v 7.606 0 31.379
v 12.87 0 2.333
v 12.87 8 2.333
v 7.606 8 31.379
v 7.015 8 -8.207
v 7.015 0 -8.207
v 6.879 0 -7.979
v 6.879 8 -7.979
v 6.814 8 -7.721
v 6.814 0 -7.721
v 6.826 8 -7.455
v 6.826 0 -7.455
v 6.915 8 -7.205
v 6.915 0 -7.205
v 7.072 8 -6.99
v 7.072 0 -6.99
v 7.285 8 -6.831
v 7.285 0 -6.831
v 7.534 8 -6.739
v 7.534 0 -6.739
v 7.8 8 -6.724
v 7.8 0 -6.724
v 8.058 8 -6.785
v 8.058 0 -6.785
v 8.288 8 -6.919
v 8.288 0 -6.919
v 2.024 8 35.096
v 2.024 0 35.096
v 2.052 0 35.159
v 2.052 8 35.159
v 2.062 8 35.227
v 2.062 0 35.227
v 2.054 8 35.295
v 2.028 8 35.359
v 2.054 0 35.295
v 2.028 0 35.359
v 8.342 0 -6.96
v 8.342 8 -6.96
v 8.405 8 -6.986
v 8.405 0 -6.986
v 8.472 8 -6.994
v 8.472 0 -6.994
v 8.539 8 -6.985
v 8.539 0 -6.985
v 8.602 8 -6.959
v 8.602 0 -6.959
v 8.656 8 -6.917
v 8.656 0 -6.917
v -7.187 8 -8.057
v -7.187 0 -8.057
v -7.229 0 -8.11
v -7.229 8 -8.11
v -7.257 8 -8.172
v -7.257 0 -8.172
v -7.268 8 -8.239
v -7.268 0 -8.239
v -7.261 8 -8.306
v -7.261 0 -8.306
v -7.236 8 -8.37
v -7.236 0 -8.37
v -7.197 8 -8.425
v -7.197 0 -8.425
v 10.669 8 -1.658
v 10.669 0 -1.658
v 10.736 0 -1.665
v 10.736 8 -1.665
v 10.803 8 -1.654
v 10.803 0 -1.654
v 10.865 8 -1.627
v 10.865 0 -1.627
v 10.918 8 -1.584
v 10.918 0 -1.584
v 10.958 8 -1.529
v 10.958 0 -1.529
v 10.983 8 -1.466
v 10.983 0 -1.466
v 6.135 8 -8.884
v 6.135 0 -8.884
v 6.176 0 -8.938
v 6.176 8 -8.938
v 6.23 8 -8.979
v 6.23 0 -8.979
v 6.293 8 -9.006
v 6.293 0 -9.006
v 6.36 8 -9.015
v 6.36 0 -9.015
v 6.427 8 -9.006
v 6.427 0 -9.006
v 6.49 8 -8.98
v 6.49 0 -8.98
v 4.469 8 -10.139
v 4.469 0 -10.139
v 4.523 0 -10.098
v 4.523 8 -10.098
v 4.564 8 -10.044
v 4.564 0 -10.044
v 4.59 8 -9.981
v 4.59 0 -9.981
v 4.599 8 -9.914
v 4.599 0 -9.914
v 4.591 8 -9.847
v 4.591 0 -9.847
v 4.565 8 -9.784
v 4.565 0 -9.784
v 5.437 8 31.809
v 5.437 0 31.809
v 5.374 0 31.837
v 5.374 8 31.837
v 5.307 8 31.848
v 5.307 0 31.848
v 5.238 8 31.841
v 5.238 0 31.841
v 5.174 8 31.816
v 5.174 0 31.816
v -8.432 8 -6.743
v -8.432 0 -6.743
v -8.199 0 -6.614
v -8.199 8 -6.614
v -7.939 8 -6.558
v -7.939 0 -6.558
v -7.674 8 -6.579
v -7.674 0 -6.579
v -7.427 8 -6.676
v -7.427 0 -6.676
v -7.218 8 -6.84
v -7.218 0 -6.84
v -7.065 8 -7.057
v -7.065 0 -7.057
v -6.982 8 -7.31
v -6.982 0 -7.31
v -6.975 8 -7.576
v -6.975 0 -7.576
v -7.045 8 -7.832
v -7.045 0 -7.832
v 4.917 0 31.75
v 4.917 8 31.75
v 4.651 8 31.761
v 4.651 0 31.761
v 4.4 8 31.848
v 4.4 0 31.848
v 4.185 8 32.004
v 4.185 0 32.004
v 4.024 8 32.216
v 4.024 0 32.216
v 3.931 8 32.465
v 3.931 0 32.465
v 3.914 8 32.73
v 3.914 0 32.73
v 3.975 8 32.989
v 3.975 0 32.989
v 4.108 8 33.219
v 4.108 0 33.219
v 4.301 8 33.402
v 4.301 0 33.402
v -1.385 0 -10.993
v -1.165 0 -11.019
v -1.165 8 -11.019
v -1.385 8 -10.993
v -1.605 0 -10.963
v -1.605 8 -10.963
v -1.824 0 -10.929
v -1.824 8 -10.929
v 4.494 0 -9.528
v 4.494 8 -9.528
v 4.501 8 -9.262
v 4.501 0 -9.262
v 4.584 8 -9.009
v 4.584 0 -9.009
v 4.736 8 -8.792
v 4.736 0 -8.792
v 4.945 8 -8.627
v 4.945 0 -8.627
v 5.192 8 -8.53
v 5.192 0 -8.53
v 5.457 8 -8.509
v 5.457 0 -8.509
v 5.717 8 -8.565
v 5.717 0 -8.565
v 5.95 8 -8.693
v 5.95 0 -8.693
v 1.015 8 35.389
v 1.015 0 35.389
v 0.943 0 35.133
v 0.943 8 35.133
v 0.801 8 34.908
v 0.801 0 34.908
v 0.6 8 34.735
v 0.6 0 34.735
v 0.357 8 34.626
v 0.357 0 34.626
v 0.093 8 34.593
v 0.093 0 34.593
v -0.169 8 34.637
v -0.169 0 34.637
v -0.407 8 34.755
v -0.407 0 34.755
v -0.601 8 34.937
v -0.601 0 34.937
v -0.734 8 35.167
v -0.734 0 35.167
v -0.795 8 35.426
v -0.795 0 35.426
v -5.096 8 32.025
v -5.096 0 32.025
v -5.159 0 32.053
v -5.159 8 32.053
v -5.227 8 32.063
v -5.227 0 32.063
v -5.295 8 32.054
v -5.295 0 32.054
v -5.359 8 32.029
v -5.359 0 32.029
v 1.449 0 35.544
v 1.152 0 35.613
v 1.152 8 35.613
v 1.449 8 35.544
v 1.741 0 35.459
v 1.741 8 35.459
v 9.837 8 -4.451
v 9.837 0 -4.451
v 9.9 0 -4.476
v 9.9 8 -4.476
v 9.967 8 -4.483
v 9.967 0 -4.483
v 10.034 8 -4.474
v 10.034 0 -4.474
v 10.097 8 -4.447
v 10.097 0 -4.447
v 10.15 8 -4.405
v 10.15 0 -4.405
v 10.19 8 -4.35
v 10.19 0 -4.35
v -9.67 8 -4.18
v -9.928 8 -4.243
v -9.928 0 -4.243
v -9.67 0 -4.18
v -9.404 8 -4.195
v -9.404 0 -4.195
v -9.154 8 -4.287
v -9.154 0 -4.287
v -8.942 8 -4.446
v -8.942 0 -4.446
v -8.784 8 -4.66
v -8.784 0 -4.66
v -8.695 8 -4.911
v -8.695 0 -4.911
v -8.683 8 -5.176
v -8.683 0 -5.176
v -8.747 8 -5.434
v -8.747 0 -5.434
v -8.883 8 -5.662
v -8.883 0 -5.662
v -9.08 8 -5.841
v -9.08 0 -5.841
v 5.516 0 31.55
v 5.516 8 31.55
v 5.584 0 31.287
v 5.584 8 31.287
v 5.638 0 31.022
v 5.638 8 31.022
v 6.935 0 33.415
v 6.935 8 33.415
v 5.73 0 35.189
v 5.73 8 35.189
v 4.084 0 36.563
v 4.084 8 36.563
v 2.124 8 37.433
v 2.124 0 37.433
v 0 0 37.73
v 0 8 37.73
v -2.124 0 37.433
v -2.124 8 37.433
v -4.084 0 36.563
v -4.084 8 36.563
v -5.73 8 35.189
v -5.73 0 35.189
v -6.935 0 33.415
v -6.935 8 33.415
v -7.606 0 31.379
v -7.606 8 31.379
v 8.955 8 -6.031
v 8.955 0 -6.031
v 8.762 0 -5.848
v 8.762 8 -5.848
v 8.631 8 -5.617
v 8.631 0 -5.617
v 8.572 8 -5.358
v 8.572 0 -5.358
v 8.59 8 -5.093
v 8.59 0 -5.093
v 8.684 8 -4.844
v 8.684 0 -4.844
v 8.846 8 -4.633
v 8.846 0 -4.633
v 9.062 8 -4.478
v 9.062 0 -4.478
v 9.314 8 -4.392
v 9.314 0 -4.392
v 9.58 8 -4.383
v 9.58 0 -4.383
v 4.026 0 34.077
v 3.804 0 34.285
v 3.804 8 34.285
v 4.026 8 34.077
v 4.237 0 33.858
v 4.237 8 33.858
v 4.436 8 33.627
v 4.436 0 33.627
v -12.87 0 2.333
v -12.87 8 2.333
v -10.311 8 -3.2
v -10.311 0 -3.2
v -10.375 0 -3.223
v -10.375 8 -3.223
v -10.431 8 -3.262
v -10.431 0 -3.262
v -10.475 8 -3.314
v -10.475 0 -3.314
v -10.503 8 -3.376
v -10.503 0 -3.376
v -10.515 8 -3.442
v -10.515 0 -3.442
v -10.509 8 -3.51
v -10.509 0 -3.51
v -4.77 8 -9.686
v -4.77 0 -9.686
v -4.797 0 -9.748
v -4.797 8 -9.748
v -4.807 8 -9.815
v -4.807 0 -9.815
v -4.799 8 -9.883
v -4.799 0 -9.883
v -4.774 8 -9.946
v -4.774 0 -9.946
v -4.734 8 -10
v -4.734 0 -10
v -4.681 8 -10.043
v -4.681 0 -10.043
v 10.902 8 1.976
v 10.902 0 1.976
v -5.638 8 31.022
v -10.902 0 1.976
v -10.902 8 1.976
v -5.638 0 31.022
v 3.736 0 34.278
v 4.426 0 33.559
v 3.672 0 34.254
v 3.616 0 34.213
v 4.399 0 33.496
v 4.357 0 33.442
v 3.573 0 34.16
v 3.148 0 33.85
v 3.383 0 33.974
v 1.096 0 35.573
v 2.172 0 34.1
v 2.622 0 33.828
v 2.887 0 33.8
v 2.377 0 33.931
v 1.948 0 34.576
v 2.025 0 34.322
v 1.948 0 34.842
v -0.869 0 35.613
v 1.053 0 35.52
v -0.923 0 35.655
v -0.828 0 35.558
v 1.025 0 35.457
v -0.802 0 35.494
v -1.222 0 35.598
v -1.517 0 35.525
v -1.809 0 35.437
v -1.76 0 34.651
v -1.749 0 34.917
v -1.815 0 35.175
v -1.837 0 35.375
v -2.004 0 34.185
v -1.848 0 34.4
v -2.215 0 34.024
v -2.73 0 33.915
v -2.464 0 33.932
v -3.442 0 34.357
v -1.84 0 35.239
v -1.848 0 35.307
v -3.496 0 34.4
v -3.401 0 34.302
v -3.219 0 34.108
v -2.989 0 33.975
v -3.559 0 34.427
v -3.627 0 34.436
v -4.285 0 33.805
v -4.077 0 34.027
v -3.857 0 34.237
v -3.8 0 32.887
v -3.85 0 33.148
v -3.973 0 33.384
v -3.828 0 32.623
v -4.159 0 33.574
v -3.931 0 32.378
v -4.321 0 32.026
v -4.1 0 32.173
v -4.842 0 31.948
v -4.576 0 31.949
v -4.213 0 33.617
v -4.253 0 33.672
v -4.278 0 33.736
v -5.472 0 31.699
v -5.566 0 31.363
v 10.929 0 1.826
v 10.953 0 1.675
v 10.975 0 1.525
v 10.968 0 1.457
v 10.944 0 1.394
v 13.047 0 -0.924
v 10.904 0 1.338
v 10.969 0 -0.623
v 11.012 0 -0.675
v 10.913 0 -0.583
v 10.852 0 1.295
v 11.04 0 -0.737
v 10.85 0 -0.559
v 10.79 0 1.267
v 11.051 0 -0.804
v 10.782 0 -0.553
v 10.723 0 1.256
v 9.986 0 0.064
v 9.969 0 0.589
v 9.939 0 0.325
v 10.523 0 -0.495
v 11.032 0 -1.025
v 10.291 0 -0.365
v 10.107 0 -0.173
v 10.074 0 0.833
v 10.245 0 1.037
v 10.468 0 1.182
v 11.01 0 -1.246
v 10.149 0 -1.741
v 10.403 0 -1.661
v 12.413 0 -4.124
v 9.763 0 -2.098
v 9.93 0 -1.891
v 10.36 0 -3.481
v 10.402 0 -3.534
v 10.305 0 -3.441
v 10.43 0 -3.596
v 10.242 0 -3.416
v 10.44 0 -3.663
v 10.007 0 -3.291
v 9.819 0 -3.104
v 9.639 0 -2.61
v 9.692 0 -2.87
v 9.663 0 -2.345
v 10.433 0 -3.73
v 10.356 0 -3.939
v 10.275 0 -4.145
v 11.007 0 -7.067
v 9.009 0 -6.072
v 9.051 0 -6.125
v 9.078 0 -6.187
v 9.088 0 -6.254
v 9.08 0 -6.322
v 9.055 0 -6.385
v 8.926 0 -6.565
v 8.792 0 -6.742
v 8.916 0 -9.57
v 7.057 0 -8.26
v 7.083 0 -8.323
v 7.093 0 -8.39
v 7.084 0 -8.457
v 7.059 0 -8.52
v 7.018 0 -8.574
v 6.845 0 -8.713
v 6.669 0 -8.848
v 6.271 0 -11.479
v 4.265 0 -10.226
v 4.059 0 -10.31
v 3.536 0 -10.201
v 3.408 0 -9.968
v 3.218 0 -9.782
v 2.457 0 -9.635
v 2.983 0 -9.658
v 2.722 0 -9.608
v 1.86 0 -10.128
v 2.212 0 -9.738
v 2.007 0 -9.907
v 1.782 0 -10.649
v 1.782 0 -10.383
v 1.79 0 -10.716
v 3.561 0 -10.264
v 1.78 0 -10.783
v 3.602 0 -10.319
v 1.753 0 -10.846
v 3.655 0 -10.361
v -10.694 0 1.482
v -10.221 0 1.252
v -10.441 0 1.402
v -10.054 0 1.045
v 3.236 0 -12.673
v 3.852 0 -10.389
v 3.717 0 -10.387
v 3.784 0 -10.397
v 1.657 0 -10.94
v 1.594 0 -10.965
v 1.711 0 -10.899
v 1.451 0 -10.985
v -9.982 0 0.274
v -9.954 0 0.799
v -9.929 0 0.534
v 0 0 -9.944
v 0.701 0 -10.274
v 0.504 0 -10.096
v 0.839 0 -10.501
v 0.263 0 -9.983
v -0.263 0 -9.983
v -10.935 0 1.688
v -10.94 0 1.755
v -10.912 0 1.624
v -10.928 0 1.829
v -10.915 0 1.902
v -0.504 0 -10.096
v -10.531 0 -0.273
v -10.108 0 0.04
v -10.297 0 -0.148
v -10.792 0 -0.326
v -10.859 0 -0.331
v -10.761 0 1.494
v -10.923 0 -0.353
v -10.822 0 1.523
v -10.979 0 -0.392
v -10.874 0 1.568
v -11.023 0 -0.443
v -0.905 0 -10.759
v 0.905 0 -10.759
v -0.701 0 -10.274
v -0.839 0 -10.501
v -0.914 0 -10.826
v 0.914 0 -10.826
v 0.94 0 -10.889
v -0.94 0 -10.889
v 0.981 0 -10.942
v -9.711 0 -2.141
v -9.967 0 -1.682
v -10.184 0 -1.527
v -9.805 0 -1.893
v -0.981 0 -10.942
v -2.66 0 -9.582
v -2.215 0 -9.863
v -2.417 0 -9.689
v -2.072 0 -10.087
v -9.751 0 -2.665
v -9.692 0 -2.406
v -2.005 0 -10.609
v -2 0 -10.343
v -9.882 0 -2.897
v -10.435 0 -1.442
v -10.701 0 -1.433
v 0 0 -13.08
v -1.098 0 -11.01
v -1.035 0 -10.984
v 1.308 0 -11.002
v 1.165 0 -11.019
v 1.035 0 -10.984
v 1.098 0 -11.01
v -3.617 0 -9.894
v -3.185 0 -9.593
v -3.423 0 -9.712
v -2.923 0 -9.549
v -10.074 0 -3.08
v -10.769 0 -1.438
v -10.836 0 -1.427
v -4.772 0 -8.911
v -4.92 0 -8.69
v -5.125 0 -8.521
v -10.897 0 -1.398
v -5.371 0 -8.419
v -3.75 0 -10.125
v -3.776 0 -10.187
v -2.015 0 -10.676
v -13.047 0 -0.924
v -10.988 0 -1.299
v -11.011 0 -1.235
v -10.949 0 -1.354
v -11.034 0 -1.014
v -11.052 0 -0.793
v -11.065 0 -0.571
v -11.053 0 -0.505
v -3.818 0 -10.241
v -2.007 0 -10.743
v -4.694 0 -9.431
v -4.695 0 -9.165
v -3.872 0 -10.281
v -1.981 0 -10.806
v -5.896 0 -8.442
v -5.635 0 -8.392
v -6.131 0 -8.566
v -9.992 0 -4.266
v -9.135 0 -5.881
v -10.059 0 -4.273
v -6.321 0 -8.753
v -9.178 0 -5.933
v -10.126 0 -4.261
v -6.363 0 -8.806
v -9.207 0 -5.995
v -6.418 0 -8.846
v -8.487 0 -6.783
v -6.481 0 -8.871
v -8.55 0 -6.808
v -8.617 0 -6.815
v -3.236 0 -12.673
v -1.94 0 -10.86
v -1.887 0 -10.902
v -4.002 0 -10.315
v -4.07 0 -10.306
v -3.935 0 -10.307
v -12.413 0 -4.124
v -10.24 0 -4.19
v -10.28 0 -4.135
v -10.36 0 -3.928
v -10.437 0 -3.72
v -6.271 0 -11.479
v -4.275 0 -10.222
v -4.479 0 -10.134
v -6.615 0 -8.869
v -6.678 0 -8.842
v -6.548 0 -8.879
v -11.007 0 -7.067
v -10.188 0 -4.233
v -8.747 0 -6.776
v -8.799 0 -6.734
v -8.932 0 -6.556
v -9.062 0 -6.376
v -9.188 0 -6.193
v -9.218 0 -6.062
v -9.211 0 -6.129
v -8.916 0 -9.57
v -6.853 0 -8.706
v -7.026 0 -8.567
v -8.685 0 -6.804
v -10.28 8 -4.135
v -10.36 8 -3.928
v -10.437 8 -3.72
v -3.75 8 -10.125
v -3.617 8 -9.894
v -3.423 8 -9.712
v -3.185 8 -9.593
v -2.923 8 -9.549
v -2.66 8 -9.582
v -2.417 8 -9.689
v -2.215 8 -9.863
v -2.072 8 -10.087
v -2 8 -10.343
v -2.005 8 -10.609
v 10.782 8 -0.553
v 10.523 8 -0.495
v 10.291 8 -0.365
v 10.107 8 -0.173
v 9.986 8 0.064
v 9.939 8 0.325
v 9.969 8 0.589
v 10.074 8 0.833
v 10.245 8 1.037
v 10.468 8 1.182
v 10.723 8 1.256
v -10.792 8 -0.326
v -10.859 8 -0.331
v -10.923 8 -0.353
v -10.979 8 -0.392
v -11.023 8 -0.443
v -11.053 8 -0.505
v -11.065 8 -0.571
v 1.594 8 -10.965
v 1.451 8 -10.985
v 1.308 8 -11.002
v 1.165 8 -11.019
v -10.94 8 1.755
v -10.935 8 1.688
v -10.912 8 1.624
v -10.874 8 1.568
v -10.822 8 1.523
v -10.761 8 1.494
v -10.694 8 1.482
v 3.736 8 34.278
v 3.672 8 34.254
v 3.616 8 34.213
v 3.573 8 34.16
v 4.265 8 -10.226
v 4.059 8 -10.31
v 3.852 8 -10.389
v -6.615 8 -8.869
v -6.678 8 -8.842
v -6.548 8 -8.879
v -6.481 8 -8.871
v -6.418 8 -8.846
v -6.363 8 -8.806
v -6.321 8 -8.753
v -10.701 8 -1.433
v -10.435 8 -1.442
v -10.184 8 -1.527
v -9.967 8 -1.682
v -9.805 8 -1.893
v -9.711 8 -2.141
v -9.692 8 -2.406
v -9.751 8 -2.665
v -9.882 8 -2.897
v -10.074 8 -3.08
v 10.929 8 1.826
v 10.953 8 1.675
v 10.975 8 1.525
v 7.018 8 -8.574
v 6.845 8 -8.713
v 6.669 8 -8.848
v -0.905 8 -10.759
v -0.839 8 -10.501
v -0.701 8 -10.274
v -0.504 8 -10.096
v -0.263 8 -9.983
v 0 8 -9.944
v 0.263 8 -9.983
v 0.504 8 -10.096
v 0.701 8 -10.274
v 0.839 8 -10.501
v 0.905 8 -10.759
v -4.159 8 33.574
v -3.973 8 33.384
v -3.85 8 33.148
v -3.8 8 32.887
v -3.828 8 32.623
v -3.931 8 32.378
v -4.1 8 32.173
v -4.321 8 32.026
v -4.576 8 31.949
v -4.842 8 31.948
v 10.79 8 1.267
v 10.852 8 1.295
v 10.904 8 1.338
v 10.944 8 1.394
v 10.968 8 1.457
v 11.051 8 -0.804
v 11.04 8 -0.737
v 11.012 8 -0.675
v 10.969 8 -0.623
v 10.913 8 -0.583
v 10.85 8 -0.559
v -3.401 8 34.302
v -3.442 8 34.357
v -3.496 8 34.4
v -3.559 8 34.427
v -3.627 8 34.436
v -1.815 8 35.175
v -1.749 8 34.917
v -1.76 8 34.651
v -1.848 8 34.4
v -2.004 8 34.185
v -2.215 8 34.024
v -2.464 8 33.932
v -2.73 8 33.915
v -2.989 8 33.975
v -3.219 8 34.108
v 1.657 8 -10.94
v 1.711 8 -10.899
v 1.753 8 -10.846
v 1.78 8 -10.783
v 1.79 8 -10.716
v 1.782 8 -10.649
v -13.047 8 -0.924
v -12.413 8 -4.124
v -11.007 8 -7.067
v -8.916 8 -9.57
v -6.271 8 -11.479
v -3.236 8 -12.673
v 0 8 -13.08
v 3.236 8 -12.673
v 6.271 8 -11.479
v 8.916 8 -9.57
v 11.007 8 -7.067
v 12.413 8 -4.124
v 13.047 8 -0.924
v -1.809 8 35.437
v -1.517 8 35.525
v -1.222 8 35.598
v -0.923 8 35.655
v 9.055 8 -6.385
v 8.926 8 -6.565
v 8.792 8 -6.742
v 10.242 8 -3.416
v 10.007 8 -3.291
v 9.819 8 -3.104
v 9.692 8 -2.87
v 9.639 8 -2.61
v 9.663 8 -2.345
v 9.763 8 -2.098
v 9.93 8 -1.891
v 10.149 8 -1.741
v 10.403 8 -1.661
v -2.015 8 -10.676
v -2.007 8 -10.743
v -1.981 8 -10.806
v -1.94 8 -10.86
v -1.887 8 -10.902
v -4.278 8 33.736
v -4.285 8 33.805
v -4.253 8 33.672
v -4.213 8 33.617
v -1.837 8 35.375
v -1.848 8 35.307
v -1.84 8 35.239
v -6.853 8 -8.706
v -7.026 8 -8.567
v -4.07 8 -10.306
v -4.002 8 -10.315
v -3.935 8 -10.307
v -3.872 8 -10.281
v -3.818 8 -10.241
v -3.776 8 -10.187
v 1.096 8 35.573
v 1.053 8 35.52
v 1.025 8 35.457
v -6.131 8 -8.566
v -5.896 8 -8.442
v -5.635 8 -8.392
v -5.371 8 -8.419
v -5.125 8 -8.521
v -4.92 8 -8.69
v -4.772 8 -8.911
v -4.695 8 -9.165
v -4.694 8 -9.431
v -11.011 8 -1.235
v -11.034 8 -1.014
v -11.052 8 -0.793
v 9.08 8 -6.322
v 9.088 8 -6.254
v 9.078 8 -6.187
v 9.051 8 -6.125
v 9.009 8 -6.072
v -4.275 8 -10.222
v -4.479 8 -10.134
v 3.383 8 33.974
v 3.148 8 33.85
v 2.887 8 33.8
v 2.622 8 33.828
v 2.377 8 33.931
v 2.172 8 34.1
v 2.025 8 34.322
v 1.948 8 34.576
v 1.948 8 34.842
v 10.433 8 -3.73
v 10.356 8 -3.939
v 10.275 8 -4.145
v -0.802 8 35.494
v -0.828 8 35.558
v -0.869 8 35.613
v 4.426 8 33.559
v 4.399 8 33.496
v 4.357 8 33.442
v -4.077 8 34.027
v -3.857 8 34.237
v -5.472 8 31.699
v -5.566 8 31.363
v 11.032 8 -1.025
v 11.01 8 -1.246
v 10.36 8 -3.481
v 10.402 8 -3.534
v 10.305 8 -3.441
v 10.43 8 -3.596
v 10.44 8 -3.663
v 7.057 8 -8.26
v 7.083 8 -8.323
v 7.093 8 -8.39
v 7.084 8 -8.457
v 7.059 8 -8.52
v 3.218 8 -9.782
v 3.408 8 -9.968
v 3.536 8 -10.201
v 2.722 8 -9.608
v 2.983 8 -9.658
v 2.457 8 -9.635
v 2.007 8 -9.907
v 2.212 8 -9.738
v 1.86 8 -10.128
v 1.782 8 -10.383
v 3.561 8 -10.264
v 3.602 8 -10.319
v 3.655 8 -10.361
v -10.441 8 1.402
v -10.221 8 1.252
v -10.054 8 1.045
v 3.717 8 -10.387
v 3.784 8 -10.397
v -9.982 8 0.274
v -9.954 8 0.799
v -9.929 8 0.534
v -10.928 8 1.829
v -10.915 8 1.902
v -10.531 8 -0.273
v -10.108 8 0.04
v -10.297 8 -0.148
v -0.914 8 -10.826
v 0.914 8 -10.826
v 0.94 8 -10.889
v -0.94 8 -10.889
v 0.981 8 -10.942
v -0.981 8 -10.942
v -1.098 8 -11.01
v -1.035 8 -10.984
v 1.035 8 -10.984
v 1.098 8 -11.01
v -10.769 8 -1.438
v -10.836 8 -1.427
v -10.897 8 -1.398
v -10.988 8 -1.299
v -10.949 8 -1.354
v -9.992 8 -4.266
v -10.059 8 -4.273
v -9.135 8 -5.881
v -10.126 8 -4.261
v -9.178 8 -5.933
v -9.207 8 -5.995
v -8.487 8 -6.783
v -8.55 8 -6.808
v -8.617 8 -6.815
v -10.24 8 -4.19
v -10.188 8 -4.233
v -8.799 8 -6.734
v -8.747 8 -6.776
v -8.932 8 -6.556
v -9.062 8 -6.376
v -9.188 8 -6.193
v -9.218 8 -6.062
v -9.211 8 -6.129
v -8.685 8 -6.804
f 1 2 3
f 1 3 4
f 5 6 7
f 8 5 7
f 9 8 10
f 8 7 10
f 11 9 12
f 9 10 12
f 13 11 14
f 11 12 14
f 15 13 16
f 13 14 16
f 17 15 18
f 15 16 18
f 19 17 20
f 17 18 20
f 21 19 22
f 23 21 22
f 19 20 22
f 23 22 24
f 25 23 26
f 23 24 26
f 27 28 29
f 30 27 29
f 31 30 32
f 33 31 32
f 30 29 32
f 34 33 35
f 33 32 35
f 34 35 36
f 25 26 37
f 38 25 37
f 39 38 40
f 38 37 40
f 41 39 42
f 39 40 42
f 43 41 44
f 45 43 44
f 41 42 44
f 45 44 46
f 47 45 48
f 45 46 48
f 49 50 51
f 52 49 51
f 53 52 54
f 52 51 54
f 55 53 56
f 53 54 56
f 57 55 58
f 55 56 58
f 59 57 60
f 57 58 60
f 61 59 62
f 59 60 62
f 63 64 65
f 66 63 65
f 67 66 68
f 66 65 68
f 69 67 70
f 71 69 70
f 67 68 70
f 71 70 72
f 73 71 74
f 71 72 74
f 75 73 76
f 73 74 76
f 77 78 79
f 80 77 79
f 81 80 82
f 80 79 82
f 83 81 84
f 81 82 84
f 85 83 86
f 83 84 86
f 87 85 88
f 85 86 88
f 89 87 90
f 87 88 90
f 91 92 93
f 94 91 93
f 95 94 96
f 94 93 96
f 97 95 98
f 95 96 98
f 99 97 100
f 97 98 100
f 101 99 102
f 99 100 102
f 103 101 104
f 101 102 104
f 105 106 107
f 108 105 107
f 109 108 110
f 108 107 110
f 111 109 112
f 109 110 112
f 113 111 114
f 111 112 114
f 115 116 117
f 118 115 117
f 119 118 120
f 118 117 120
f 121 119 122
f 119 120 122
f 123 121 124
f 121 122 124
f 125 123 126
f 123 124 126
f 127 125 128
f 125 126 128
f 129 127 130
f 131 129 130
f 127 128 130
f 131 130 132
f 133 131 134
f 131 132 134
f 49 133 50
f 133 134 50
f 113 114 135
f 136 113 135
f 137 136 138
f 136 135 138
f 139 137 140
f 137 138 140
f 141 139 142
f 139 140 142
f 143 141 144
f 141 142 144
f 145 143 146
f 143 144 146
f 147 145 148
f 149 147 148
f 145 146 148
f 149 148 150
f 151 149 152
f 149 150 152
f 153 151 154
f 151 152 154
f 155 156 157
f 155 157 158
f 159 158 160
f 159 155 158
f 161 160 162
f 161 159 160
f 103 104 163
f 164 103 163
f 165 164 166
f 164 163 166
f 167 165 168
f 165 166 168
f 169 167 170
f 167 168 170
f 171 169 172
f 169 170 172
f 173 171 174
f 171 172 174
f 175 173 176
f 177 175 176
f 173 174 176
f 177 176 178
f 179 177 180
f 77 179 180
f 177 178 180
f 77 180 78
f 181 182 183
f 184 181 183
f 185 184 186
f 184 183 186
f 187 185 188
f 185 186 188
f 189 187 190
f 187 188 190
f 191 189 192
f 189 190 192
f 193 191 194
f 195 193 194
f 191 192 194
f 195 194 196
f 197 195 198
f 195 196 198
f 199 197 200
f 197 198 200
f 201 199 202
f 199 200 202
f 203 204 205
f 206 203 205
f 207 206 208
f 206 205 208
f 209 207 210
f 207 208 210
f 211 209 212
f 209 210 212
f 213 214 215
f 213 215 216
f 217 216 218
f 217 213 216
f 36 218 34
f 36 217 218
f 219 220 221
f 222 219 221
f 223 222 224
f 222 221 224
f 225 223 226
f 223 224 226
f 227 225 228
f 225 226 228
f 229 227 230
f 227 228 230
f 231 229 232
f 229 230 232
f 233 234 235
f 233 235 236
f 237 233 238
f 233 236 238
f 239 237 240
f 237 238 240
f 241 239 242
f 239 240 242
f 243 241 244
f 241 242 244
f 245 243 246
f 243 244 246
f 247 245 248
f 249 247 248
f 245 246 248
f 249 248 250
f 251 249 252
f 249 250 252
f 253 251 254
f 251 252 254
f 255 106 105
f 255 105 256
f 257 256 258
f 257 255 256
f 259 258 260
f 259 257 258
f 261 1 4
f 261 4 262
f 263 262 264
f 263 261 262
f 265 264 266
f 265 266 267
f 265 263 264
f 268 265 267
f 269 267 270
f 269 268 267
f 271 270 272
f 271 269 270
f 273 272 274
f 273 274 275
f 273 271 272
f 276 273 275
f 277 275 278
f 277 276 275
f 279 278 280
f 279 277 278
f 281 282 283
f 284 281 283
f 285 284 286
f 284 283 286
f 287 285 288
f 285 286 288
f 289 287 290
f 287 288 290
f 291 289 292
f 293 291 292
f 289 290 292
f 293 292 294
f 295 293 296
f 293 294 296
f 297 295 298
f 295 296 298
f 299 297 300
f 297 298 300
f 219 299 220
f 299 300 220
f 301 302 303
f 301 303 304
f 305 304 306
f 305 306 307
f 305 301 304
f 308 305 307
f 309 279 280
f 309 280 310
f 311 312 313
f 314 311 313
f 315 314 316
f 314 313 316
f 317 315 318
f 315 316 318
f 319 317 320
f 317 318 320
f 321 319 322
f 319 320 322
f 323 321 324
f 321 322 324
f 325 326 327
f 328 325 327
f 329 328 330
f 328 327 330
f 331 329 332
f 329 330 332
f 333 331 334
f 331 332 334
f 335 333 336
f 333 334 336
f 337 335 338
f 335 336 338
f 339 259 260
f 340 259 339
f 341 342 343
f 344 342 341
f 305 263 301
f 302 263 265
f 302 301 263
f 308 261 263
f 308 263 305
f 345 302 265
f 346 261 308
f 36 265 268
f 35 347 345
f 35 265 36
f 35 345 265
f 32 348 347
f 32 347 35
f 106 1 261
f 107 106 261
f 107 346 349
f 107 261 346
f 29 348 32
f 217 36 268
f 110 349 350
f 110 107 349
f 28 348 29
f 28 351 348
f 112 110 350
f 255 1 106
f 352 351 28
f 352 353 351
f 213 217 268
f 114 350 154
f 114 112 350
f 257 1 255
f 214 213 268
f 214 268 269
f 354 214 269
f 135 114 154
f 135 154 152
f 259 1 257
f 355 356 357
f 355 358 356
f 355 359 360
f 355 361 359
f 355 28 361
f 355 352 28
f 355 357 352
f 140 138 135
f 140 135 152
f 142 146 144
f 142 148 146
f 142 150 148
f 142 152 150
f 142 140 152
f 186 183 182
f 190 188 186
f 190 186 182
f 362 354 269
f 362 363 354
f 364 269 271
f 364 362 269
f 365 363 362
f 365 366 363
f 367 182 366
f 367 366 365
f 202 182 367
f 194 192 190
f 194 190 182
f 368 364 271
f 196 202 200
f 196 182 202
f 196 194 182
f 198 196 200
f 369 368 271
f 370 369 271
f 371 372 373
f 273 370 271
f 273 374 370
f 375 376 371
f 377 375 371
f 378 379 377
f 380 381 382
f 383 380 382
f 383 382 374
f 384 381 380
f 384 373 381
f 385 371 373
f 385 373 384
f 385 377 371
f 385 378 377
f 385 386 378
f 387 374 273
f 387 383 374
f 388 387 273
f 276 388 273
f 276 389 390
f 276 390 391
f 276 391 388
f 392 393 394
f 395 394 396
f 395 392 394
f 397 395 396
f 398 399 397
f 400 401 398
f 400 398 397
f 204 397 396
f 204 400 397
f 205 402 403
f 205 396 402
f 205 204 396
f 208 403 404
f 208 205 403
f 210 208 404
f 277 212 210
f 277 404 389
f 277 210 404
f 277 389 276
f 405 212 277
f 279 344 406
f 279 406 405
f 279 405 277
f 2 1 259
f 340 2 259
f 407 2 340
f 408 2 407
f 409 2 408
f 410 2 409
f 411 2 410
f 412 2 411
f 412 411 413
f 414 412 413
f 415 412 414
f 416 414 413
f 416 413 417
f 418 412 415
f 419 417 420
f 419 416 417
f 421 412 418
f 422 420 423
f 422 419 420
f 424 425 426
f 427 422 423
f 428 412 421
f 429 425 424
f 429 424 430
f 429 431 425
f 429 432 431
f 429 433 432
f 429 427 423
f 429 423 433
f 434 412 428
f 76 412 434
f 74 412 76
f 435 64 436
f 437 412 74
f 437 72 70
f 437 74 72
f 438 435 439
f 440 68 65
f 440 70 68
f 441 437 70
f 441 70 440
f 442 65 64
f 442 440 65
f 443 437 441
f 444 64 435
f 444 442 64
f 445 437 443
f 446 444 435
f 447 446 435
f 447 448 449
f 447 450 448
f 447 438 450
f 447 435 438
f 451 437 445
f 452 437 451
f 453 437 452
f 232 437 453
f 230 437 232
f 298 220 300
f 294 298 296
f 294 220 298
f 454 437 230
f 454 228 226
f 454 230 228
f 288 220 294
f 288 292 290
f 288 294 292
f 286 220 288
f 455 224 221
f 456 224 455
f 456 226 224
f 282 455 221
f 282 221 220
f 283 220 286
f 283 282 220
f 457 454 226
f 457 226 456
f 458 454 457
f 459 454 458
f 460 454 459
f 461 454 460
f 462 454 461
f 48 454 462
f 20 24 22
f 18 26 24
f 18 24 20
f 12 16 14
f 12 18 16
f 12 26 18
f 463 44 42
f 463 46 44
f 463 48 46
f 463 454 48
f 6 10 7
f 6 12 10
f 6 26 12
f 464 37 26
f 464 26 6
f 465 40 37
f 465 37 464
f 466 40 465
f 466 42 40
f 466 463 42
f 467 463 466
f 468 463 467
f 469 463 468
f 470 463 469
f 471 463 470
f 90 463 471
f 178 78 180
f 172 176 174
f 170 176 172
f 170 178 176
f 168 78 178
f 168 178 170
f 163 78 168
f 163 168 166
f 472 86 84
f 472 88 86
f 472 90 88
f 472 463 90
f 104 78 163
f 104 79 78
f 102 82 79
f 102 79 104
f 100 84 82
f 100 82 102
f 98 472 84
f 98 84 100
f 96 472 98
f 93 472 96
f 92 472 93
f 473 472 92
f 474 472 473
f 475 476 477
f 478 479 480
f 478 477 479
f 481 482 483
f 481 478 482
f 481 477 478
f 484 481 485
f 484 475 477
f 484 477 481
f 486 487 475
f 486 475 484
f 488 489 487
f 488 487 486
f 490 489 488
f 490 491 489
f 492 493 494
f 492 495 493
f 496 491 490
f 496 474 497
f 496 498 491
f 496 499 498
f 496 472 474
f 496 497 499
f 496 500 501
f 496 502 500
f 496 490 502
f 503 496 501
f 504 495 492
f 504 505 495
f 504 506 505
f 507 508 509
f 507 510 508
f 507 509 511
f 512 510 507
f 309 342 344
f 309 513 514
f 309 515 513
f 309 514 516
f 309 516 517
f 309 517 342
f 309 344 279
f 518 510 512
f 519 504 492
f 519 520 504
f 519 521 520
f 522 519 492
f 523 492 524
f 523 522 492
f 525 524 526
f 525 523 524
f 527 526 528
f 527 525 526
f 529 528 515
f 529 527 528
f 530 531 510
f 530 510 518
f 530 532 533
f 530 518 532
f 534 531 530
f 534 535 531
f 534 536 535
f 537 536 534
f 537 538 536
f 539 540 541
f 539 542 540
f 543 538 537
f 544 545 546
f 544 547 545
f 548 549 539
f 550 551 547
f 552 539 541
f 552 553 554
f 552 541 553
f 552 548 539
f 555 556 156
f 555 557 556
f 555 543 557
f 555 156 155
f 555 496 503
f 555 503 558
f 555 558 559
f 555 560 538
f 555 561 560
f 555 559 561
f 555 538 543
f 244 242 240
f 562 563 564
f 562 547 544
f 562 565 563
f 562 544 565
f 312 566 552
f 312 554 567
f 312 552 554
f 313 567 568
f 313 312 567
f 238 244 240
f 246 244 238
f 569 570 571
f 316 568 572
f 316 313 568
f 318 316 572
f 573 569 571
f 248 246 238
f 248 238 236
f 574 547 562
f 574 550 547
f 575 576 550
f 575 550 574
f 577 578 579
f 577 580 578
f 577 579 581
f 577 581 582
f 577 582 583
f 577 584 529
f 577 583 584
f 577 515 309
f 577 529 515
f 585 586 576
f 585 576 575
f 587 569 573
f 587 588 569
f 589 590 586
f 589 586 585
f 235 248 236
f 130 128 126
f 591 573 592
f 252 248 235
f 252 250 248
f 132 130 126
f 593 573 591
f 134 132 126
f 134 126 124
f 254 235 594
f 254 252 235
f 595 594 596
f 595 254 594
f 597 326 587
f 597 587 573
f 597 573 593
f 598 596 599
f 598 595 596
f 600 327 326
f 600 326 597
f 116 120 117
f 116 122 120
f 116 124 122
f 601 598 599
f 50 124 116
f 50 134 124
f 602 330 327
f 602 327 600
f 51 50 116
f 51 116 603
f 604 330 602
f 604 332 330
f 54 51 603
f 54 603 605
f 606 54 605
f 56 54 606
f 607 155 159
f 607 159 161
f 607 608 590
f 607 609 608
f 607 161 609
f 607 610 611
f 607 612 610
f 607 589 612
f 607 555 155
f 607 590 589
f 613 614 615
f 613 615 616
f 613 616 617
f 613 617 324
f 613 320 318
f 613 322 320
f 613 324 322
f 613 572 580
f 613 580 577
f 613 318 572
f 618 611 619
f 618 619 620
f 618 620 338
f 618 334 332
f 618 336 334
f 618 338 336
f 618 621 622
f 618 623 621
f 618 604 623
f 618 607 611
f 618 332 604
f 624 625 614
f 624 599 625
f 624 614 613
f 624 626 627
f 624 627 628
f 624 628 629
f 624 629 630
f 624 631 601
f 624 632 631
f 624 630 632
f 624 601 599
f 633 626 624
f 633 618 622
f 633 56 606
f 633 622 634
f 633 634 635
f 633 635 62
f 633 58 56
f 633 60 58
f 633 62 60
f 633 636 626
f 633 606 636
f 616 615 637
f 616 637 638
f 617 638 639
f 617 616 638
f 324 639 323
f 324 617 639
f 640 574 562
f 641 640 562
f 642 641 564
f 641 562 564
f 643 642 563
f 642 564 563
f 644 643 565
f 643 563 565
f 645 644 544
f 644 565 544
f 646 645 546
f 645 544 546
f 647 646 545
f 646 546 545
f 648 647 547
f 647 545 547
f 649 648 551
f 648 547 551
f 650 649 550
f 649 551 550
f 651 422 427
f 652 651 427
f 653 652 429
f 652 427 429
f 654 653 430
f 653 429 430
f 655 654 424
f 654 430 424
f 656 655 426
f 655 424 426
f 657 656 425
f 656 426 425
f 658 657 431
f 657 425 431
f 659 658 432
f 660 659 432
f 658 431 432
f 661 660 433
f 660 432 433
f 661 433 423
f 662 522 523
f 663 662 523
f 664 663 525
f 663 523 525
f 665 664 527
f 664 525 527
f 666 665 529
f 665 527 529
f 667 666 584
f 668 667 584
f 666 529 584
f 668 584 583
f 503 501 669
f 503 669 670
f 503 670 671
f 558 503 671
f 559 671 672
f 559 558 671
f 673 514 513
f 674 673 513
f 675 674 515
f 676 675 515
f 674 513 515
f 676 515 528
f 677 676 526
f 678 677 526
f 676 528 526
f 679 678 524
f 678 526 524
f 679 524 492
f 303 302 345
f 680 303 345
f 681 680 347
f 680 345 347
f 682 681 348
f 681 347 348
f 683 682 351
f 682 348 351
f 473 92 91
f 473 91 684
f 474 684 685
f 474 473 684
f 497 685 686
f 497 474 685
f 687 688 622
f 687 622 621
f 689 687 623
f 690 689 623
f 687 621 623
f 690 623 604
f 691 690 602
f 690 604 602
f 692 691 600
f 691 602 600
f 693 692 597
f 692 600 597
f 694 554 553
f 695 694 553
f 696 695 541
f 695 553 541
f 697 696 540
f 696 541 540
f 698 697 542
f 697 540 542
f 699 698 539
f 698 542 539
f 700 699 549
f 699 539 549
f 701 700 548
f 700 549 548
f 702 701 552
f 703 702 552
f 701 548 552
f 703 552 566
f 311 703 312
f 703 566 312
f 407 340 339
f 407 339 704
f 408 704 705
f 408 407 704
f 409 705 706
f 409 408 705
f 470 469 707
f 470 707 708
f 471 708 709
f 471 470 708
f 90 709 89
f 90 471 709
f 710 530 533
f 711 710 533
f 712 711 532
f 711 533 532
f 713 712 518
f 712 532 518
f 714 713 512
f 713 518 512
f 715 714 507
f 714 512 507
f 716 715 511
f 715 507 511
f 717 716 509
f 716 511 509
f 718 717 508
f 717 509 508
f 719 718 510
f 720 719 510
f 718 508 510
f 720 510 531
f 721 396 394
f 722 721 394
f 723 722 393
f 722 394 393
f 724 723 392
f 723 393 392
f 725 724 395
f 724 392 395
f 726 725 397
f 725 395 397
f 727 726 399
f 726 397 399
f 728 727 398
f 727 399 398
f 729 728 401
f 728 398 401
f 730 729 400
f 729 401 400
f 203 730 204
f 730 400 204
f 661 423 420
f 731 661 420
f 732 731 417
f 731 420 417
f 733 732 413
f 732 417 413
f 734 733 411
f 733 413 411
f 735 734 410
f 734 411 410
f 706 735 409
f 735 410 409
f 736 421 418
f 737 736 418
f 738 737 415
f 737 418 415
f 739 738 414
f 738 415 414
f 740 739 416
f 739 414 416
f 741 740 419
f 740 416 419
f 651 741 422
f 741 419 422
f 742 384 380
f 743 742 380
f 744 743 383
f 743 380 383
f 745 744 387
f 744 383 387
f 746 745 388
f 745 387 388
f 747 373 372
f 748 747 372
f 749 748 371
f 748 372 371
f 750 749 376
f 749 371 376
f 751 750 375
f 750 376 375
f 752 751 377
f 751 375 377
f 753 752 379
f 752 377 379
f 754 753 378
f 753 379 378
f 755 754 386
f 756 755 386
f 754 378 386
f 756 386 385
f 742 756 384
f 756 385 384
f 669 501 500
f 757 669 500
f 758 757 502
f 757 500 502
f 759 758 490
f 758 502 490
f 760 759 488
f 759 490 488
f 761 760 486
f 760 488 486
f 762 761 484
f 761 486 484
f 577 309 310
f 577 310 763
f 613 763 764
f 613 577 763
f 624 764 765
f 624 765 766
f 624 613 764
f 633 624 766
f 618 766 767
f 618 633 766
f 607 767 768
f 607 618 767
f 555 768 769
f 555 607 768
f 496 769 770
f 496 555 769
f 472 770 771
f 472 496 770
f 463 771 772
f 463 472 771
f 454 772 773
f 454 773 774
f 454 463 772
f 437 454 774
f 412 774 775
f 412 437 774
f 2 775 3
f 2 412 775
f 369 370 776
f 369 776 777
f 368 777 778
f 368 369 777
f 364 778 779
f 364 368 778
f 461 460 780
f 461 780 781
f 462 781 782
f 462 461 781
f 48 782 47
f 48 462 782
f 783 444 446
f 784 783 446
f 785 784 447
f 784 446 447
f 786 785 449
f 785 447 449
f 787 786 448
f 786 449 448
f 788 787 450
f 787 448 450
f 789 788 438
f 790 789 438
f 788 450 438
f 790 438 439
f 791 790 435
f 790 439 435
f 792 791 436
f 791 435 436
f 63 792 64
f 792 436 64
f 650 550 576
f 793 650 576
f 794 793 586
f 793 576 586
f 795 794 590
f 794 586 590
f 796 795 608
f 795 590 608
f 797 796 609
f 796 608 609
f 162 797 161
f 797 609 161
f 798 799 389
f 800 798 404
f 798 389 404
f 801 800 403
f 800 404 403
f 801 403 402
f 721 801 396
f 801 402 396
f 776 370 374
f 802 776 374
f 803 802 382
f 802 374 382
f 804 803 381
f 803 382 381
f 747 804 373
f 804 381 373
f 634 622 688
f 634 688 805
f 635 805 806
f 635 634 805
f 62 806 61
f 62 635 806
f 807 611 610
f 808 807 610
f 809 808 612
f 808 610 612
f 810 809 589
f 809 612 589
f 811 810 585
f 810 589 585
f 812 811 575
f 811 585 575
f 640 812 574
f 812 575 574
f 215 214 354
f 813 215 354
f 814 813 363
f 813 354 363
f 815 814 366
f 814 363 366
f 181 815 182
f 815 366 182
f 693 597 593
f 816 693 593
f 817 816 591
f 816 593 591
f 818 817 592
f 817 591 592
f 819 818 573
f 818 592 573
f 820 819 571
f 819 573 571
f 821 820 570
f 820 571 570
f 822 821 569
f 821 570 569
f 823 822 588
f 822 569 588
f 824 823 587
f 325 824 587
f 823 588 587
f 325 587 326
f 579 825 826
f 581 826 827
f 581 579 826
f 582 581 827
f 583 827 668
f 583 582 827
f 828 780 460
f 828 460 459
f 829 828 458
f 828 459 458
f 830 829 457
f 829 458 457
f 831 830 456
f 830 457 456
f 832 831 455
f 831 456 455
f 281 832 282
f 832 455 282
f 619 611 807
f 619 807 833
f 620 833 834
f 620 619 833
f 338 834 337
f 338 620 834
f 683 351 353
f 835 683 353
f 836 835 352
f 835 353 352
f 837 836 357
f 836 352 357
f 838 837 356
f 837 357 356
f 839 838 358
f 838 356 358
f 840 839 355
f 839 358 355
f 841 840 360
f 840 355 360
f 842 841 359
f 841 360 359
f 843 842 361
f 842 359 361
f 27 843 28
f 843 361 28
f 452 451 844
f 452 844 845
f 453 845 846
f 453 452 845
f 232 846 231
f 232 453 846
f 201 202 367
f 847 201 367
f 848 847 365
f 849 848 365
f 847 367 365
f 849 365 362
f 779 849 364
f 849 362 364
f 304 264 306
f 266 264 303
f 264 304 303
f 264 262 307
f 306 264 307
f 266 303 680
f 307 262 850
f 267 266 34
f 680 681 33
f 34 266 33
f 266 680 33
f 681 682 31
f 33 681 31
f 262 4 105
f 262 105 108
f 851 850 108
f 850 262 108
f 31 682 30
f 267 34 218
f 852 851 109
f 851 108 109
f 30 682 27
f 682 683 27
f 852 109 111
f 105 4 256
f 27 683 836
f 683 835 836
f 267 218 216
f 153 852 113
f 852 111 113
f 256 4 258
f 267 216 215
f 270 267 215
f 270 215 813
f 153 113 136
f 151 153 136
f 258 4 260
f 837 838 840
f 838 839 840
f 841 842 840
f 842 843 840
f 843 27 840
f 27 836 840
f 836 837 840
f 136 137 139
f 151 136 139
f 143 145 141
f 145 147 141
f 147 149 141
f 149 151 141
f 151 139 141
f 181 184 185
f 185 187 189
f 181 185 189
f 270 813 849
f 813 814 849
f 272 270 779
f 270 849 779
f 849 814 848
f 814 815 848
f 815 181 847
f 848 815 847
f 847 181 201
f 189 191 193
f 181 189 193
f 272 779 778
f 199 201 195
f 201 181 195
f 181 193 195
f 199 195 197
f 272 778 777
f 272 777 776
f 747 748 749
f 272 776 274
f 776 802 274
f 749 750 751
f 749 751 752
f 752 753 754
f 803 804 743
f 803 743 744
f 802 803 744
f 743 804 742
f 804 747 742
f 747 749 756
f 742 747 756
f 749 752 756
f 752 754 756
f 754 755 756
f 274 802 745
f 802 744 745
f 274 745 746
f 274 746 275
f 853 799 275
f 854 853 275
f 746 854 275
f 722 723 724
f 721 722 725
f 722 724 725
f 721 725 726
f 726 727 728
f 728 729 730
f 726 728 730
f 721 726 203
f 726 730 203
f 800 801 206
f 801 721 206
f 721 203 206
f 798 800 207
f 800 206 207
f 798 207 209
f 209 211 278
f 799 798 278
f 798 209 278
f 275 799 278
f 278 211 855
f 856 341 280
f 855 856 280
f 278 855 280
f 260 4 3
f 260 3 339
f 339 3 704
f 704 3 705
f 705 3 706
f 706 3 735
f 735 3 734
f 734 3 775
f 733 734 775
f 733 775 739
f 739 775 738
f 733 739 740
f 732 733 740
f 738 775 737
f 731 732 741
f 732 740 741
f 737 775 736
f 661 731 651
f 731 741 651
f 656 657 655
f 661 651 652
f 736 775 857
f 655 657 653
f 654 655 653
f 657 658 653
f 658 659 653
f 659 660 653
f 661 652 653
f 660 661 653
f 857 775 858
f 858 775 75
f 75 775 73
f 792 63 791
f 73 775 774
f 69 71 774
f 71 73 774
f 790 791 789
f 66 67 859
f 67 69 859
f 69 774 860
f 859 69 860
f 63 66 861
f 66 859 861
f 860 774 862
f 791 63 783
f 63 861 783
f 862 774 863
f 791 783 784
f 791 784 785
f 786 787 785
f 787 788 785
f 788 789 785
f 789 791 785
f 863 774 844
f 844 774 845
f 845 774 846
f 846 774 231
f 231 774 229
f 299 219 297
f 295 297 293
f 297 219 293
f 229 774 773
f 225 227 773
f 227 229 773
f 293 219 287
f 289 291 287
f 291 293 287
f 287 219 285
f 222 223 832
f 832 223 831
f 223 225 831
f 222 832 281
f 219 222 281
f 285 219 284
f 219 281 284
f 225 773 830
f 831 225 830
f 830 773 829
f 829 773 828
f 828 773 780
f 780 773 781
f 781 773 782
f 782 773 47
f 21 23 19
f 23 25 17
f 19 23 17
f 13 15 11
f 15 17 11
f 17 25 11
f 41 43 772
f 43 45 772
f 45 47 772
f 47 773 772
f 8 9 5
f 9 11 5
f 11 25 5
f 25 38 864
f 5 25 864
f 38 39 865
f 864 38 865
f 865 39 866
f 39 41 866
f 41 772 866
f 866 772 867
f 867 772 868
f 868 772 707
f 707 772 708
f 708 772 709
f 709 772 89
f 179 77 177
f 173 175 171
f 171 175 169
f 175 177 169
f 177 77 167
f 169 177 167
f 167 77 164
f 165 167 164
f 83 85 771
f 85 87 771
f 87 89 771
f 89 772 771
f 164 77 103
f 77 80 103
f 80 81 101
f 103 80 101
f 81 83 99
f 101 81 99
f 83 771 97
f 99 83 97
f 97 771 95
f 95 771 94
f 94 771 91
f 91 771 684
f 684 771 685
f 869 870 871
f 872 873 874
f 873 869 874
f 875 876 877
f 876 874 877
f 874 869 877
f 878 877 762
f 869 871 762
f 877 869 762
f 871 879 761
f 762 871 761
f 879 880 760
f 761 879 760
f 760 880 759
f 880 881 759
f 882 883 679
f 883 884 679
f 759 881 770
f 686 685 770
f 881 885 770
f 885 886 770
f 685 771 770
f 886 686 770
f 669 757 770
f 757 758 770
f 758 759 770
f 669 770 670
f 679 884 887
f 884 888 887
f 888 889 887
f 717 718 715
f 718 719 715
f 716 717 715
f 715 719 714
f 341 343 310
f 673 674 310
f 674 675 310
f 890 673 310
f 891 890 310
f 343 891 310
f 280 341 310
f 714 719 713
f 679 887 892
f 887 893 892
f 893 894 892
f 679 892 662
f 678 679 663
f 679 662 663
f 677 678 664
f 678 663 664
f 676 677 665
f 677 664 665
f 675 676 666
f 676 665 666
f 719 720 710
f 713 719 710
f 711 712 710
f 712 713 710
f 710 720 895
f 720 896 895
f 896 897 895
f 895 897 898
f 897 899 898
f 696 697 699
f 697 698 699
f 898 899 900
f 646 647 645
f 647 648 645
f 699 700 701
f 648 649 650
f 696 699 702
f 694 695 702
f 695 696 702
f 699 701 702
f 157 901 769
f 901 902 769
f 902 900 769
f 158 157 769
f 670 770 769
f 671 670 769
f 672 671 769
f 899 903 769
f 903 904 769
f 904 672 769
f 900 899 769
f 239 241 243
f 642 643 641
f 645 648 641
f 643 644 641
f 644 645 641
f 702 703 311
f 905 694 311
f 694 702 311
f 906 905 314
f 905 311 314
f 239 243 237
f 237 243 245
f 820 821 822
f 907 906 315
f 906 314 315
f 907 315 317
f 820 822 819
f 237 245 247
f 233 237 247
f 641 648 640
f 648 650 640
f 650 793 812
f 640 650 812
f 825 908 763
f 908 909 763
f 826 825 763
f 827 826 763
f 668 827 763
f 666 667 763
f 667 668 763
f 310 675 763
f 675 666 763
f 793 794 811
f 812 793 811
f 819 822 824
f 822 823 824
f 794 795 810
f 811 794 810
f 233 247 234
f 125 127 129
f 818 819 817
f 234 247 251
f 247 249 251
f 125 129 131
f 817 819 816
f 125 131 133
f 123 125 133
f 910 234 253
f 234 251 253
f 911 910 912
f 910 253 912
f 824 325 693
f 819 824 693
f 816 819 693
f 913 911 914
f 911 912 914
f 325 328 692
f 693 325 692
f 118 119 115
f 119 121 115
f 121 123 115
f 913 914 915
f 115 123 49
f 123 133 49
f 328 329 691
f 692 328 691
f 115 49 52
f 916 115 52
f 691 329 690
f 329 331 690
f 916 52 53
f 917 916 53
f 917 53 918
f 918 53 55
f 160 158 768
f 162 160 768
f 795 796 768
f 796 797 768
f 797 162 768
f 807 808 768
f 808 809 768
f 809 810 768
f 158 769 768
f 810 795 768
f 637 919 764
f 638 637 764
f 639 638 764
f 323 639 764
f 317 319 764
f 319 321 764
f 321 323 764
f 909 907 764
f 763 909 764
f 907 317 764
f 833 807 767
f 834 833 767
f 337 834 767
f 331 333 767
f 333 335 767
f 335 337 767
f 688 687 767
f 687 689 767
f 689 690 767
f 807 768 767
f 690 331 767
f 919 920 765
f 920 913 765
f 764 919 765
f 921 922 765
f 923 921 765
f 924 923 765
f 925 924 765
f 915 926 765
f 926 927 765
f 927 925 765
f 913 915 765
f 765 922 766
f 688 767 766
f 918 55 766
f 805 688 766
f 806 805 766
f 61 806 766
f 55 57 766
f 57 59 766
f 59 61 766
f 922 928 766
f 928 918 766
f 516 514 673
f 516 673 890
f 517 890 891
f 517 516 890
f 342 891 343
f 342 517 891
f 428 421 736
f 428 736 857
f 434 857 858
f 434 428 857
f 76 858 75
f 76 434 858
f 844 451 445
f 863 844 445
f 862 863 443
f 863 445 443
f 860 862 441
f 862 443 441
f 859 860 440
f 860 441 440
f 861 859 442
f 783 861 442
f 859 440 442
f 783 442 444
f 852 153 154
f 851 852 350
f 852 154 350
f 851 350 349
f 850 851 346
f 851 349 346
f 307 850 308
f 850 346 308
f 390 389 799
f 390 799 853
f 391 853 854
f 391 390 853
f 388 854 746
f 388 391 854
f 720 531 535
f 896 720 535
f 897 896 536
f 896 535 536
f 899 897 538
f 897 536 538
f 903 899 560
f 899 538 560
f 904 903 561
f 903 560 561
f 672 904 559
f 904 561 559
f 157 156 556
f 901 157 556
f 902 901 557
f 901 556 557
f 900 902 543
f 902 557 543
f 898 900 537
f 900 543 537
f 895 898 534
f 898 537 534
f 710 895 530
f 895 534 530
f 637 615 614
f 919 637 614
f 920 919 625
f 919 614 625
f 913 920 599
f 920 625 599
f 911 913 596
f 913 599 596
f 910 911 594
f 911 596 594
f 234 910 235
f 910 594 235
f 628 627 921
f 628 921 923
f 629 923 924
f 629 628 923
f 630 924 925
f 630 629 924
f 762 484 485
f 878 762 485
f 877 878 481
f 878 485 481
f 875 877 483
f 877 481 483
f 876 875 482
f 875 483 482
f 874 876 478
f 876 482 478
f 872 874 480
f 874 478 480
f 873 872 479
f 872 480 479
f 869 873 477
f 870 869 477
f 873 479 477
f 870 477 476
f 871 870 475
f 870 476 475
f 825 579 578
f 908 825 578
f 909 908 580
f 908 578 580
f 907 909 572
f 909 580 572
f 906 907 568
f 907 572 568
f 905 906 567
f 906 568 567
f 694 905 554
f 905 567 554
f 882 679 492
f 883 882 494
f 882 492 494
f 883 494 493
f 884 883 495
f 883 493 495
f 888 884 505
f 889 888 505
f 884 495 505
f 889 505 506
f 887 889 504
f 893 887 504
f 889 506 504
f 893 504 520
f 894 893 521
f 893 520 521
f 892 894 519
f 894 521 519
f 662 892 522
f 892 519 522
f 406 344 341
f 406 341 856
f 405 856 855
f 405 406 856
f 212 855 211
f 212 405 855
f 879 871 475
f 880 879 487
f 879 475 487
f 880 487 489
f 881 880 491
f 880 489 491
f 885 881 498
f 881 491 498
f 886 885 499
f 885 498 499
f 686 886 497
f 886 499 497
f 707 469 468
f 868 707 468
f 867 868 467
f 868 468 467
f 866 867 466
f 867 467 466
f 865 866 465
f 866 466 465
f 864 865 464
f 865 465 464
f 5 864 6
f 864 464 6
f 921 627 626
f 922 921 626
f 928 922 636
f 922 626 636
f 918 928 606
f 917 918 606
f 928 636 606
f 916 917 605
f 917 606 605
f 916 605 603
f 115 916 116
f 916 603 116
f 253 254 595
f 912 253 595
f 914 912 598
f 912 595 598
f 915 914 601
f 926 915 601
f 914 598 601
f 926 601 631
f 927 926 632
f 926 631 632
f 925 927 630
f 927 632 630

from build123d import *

# Parameters (mm, degrees)
BOSS_EXTRUDE1_DEPTH = 8
BOSS_EXTRUDE3_DEPTH = 8
CRVPATTERN1_DEPTH   = 8


# Read off the part's stored shape, not the designer's step: CrvPattern1
with BuildPart() as part:
    # Sketch1 → Boss-Extrude1 (new body)
    with BuildSketch(Plane(origin=(0, 0, 0), x_dir=(1, 0, 0), z_dir=(0, 1, 0))):
        with BuildLine():
            Line((-7.606089126, -31.378516667), (-12.870329337, -2.3326))
            ThreePointArc((-12.870329337, -2.3326), (0, 13.08), (12.870329337, -2.3326))
            Line((12.870329337, -2.3326), (7.606089126, -31.378516667))
            ThreePointArc((7.606089126, -31.378516667), (0, -37.73), (-7.606089126, -31.378516667))
        make_face()
        with BuildLine():
            ThreePointArc((-5.638148861, -31.02185), (0, -35.73), (5.638148861, -31.02185))
            Line((5.638148861, -31.02185), (10.902389071, -1.975933333))
            ThreePointArc((10.902389071, -1.975933333), (0, 11.08), (-10.902389071, -1.975933333))
            Line((-10.902389071, -1.975933333), (-5.638148861, -31.02185))
        make_face(mode=Mode.SUBTRACT)
    extrude(amount=BOSS_EXTRUDE1_DEPTH)

    # Sketch2 → Boss-Extrude3 (add)
    with BuildSketch(Plane(origin=(0, 0, 0), x_dir=(1, 0, 0), z_dir=(0, 1, 0))):
        with BuildLine():
            ThreePointArc((-1.165, 11.018583167), (-0.981152237, 10.94243093), (-0.905, 10.758583167))
            ThreePointArc((-0.905, 10.758583167), (0, 9.943845961), (0.905, 10.758583167))
            ThreePointArc((0.905, 10.758583167), (0.981152237, 10.94243093), (1.165, 11.018583167))
            ThreePointArc((1.165, 11.018583167), (0, 11.08), (-1.165, 11.018583167))
        make_face()
    extrude(amount=BOSS_EXTRUDE3_DEPTH)

    # CrvPattern1 outline → CrvPattern1 (add)
    with BuildSketch(Plane(origin=(0, 0, 0), x_dir=(1, 0, 0), z_dir=(0, 1, 0))):
        with BuildLine():
            ThreePointArc((-1.824495283, 10.928751849), (-2.963479144, 10.676337919), (-4.069609665, 10.30556535))
            ThreePointArc((-4.069609665, 10.30556535), (-3.872091938, 10.281359754), (-3.749541755, 10.124577689))
            ThreePointArc((-3.749541755, 10.124577689), (-2.659601093, 9.581575785), (-2.005482944, 10.608683939))
            ThreePointArc((-2.005482944, 10.608683939), (-1.981277348, 10.806201665), (-1.824495283, 10.928751849))
        make_face()
        with BuildLine():
            ThreePointArc((-10.791666914, 0.325671569), (-10.979340539, 0.391836316), (-11.06526029, 0.57132715))
            ThreePointArc((-11.06526029, 0.57132715), (-11.063997012, -0.595289939), (-10.940077478, -1.755307601))
            ThreePointArc((-10.940077478, -1.755307601), (-10.873912731, -1.567633976), (-10.694421897, -1.481714224))
            ThreePointArc((-10.694421897, -1.481714224), (-9.929483935, -0.534248326), (-10.791666914, 0.325671569))
        make_face()
        with BuildLine():
            ThreePointArc((-10.311404493, 3.200167829), (-10.474544311, 3.314117655), (-10.509326889, 3.510049622))
            ThreePointArc((-10.509326889, 3.510049622), (-10.820135393, 2.385596376), (-11.010991108, 1.23469624))
            ThreePointArc((-11.010991108, 1.23469624), (-10.897041283, 1.397836059), (-10.701109316, 1.432618636))
            ThreePointArc((-10.701109316, 1.432618636), (-9.710628125, 2.14097499), (-10.311404493, 3.200167829))
        make_face()
        with BuildLine():
            ThreePointArc((-9.079820232, 5.841489648), (-9.206539356, 5.994921805), (-9.18765039, 6.193018676))
            ThreePointArc((-9.18765039, 6.193018676), (-9.787884177, 5.192660526), (-10.279608785, 4.134736173))
            ThreePointArc((-10.279608785, 4.134736173), (-10.126176628, 4.261455297), (-9.928079758, 4.242566331))
            ThreePointArc((-9.928079758, 4.242566331), (-8.784224959, 4.660200036), (-9.079820232, 5.841489648))
        make_face()
        with BuildLine():
            ThreePointArc((-7.18665129, 8.057181889), (-7.267716561, 8.23891682), (-7.196532361, 8.424744624))
            ThreePointArc((-7.196532361, 8.424744624), (-8.042456481, 7.621370857), (-8.799221359, 6.733506032))
            ThreePointArc((-8.799221359, 6.733506032), (-8.617486428, 6.814571302), (-8.431658623, 6.743387102))
            ThreePointArc((-8.431658623, 6.743387102), (-7.217775126, 6.839868035), (-7.18665129, 8.057181889))
        make_face()
        with BuildLine():
            ThreePointArc((-4.76984, 9.685802142), (-4.799344742, 9.88259806), (-4.681052017, 10.042616791))
            ThreePointArc((-4.681052017, 10.042616791), (-5.71102974, 9.494763784), (-6.677694581, 8.841651151))
            ThreePointArc((-6.677694581, 8.841651151), (-6.480898663, 8.871155893), (-6.320879932, 8.752863168))
            ThreePointArc((-6.320879932, 8.752863168), (-5.125415163, 8.521161417), (-4.76984, 9.685802142))
        make_face()
        with BuildLine():
            ThreePointArc((-5.358787187, -32.02886665), (-4.902775765, -32.965752822), (-4.284641775, -33.804568945))
            ThreePointArc((-4.284641775, -33.804568945), (-4.253283685, -33.672171144), (-4.159348022, -33.573740464))
            ThreePointArc((-4.159348022, -33.573740464), (-3.930645139, -32.377698364), (-5.096173957, -32.025045153))
            ThreePointArc((-5.096173957, -32.025045153), (-5.226962568, -32.062553109), (-5.358787187, -32.02886665))
        make_face()
        with BuildLine():
            ThreePointArc((4.301302835, -33.401557112), (4.399165403, -33.496084492), (4.435884173, -33.627096856))
            ThreePointArc((4.435884173, -33.627096856), (5.019378866, -32.763826296), (5.436895219, -31.809162894))
            ThreePointArc((5.436895219, -31.809162894), (5.306550294, -31.848184784), (5.174343952, -31.816029058))
            ThreePointArc((5.174343952, -31.816029058), (4.024127982, -32.215810168), (4.301302835, -33.401557112))
        make_face()
        with BuildLine():
            ThreePointArc((2.024455519, -35.096408218), (2.061948343, -35.227201168), (2.028246633, -35.359021888))
            ThreePointArc((2.028246633, -35.359021888), (2.965185558, -34.903118865), (3.804073193, -34.28508193))
            ThreePointArc((3.804073193, -34.28508193), (3.671679021, -34.253708522), (3.57325921, -34.159761471))
            ThreePointArc((3.57325921, -34.159761471), (2.377243578, -33.930920208), (2.024455519, -35.096408218))
        make_face()
        with BuildLine():
            ThreePointArc((-0.794764946, -35.425877399), (-0.827686591, -35.557895098), (-0.922779735, -35.655208003))
            ThreePointArc((-0.922779735, -35.655208003), (0.116587527, -35.728813782), (1.15209953, -35.612981977))
            ThreePointArc((1.15209953, -35.612981977), (1.053125917, -35.519618539), (1.01486035, -35.389049577))
            ThreePointArc((1.01486035, -35.389049577), (0.093470356, -34.592894948), (-0.794764946, -35.425877399))
        make_face()
        with BuildLine():
            ThreePointArc((-3.401059435, -34.301696362), (-3.495575491, -34.399569865), (-3.626583606, -34.436303793))
            ThreePointArc((-3.626583606, -34.436303793), (-2.763245543, -35.019698603), (-1.808533841, -35.4371045))
            ThreePointArc((-1.808533841, -35.4371045), (-1.847570812, -35.30676409), (-1.815430382, -35.174554029))
            ThreePointArc((-1.815430382, -35.174554029), (-2.215344568, -34.02438432), (-3.401059435, -34.301696362))
        make_face()
        with BuildLine():
            ThreePointArc((10.974594379, -1.524689547), (11.074074387, -0.36232095), (11.05078642, 0.804064363))
            ThreePointArc((11.05078642, 0.804064363), (10.968663006, 0.622805134), (10.782423353, 0.552705528))
            ThreePointArc((10.782423353, 0.552705528), (9.938527966, -0.325168205), (10.723235544, -1.25632648))
            ThreePointArc((10.723235544, -1.25632648), (10.904494773, -1.338449894), (10.974594379, -1.524689547))
        make_face()
        with BuildLine():
            ThreePointArc((3.535643905, 10.201243009), (3.654867535, 10.36056937), (3.851832122, 10.388926282))
            ThreePointArc((3.851832122, 10.388926282), (2.738143815, 10.73633869), (1.59410025, 10.964727283))
            ThreePointArc((1.59410025, 10.964727283), (1.753426611, 10.845503653), (1.781783523, 10.648539065))
            ThreePointArc((1.781783523, 10.648539065), (2.457371869, 9.635424017), (3.535643905, 10.201243009))
        make_face()
        with BuildLine():
            ThreePointArc((6.135279783, 8.883944999), (6.292773656, 9.005579053), (6.490146906, 8.980222333))
            ThreePointArc((6.490146906, 8.980222333), (5.509951663, 9.612847272), (4.468672705, 10.138903504))
            ThreePointArc((4.468672705, 10.138903504), (4.590306759, 9.981409631), (4.564950039, 9.784036381))
            ThreePointArc((4.564950039, 9.784036381), (4.944955829, 8.627136509), (6.135279783, 8.883944999))
        make_face()
        with BuildLine():
            ThreePointArc((8.287879594, 6.919334403), (8.472168203, 6.994413506), (8.655568872, 6.917190724))
            ThreePointArc((8.655568872, 6.917190724), (7.880286848, 7.788933123), (7.017643405, 8.574326857))
            ThreePointArc((7.017643405, 8.574326857), (7.092722508, 8.390038247), (7.015499725, 8.206637579))
            ThreePointArc((7.015499725, 8.206637579), (7.072234526, 6.990248301), (8.287879594, 6.919334403))
        make_face()
        with BuildLine():
            ThreePointArc((9.836598048, 4.450559019), (10.034253538, 4.473612668), (10.190318466, 4.350150522))
            ThreePointArc((10.190318466, 4.350150522), (9.676439183, 5.397492448), (9.055286209, 6.38499739))
            ThreePointArc((9.055286209, 6.38499739), (9.078339857, 6.187341901), (8.954877712, 6.031276973))
            ThreePointArc((8.954877712, 6.031276973), (8.684207644, 4.844028293), (9.836598048, 4.450559019))
        make_face()
        with BuildLine():
            ThreePointArc((10.668590575, 1.657501702), (10.865211135, 1.626850133), (10.982568934, 1.46614447))
            ThreePointArc((10.982568934, 1.46614447), (10.767535277, 2.612773248), (10.43313196, 3.730436636))
            ThreePointArc((10.43313196, 3.730436636), (10.402480392, 3.533816076), (10.241774729, 3.416458277))
            ThreePointArc((10.241774729, 3.416458277), (9.663421677, 2.344856923), (10.668590575, 1.657501702))
        make_face()
    extrude(amount=CRVPATTERN1_DEPTH)


solid = part.part
